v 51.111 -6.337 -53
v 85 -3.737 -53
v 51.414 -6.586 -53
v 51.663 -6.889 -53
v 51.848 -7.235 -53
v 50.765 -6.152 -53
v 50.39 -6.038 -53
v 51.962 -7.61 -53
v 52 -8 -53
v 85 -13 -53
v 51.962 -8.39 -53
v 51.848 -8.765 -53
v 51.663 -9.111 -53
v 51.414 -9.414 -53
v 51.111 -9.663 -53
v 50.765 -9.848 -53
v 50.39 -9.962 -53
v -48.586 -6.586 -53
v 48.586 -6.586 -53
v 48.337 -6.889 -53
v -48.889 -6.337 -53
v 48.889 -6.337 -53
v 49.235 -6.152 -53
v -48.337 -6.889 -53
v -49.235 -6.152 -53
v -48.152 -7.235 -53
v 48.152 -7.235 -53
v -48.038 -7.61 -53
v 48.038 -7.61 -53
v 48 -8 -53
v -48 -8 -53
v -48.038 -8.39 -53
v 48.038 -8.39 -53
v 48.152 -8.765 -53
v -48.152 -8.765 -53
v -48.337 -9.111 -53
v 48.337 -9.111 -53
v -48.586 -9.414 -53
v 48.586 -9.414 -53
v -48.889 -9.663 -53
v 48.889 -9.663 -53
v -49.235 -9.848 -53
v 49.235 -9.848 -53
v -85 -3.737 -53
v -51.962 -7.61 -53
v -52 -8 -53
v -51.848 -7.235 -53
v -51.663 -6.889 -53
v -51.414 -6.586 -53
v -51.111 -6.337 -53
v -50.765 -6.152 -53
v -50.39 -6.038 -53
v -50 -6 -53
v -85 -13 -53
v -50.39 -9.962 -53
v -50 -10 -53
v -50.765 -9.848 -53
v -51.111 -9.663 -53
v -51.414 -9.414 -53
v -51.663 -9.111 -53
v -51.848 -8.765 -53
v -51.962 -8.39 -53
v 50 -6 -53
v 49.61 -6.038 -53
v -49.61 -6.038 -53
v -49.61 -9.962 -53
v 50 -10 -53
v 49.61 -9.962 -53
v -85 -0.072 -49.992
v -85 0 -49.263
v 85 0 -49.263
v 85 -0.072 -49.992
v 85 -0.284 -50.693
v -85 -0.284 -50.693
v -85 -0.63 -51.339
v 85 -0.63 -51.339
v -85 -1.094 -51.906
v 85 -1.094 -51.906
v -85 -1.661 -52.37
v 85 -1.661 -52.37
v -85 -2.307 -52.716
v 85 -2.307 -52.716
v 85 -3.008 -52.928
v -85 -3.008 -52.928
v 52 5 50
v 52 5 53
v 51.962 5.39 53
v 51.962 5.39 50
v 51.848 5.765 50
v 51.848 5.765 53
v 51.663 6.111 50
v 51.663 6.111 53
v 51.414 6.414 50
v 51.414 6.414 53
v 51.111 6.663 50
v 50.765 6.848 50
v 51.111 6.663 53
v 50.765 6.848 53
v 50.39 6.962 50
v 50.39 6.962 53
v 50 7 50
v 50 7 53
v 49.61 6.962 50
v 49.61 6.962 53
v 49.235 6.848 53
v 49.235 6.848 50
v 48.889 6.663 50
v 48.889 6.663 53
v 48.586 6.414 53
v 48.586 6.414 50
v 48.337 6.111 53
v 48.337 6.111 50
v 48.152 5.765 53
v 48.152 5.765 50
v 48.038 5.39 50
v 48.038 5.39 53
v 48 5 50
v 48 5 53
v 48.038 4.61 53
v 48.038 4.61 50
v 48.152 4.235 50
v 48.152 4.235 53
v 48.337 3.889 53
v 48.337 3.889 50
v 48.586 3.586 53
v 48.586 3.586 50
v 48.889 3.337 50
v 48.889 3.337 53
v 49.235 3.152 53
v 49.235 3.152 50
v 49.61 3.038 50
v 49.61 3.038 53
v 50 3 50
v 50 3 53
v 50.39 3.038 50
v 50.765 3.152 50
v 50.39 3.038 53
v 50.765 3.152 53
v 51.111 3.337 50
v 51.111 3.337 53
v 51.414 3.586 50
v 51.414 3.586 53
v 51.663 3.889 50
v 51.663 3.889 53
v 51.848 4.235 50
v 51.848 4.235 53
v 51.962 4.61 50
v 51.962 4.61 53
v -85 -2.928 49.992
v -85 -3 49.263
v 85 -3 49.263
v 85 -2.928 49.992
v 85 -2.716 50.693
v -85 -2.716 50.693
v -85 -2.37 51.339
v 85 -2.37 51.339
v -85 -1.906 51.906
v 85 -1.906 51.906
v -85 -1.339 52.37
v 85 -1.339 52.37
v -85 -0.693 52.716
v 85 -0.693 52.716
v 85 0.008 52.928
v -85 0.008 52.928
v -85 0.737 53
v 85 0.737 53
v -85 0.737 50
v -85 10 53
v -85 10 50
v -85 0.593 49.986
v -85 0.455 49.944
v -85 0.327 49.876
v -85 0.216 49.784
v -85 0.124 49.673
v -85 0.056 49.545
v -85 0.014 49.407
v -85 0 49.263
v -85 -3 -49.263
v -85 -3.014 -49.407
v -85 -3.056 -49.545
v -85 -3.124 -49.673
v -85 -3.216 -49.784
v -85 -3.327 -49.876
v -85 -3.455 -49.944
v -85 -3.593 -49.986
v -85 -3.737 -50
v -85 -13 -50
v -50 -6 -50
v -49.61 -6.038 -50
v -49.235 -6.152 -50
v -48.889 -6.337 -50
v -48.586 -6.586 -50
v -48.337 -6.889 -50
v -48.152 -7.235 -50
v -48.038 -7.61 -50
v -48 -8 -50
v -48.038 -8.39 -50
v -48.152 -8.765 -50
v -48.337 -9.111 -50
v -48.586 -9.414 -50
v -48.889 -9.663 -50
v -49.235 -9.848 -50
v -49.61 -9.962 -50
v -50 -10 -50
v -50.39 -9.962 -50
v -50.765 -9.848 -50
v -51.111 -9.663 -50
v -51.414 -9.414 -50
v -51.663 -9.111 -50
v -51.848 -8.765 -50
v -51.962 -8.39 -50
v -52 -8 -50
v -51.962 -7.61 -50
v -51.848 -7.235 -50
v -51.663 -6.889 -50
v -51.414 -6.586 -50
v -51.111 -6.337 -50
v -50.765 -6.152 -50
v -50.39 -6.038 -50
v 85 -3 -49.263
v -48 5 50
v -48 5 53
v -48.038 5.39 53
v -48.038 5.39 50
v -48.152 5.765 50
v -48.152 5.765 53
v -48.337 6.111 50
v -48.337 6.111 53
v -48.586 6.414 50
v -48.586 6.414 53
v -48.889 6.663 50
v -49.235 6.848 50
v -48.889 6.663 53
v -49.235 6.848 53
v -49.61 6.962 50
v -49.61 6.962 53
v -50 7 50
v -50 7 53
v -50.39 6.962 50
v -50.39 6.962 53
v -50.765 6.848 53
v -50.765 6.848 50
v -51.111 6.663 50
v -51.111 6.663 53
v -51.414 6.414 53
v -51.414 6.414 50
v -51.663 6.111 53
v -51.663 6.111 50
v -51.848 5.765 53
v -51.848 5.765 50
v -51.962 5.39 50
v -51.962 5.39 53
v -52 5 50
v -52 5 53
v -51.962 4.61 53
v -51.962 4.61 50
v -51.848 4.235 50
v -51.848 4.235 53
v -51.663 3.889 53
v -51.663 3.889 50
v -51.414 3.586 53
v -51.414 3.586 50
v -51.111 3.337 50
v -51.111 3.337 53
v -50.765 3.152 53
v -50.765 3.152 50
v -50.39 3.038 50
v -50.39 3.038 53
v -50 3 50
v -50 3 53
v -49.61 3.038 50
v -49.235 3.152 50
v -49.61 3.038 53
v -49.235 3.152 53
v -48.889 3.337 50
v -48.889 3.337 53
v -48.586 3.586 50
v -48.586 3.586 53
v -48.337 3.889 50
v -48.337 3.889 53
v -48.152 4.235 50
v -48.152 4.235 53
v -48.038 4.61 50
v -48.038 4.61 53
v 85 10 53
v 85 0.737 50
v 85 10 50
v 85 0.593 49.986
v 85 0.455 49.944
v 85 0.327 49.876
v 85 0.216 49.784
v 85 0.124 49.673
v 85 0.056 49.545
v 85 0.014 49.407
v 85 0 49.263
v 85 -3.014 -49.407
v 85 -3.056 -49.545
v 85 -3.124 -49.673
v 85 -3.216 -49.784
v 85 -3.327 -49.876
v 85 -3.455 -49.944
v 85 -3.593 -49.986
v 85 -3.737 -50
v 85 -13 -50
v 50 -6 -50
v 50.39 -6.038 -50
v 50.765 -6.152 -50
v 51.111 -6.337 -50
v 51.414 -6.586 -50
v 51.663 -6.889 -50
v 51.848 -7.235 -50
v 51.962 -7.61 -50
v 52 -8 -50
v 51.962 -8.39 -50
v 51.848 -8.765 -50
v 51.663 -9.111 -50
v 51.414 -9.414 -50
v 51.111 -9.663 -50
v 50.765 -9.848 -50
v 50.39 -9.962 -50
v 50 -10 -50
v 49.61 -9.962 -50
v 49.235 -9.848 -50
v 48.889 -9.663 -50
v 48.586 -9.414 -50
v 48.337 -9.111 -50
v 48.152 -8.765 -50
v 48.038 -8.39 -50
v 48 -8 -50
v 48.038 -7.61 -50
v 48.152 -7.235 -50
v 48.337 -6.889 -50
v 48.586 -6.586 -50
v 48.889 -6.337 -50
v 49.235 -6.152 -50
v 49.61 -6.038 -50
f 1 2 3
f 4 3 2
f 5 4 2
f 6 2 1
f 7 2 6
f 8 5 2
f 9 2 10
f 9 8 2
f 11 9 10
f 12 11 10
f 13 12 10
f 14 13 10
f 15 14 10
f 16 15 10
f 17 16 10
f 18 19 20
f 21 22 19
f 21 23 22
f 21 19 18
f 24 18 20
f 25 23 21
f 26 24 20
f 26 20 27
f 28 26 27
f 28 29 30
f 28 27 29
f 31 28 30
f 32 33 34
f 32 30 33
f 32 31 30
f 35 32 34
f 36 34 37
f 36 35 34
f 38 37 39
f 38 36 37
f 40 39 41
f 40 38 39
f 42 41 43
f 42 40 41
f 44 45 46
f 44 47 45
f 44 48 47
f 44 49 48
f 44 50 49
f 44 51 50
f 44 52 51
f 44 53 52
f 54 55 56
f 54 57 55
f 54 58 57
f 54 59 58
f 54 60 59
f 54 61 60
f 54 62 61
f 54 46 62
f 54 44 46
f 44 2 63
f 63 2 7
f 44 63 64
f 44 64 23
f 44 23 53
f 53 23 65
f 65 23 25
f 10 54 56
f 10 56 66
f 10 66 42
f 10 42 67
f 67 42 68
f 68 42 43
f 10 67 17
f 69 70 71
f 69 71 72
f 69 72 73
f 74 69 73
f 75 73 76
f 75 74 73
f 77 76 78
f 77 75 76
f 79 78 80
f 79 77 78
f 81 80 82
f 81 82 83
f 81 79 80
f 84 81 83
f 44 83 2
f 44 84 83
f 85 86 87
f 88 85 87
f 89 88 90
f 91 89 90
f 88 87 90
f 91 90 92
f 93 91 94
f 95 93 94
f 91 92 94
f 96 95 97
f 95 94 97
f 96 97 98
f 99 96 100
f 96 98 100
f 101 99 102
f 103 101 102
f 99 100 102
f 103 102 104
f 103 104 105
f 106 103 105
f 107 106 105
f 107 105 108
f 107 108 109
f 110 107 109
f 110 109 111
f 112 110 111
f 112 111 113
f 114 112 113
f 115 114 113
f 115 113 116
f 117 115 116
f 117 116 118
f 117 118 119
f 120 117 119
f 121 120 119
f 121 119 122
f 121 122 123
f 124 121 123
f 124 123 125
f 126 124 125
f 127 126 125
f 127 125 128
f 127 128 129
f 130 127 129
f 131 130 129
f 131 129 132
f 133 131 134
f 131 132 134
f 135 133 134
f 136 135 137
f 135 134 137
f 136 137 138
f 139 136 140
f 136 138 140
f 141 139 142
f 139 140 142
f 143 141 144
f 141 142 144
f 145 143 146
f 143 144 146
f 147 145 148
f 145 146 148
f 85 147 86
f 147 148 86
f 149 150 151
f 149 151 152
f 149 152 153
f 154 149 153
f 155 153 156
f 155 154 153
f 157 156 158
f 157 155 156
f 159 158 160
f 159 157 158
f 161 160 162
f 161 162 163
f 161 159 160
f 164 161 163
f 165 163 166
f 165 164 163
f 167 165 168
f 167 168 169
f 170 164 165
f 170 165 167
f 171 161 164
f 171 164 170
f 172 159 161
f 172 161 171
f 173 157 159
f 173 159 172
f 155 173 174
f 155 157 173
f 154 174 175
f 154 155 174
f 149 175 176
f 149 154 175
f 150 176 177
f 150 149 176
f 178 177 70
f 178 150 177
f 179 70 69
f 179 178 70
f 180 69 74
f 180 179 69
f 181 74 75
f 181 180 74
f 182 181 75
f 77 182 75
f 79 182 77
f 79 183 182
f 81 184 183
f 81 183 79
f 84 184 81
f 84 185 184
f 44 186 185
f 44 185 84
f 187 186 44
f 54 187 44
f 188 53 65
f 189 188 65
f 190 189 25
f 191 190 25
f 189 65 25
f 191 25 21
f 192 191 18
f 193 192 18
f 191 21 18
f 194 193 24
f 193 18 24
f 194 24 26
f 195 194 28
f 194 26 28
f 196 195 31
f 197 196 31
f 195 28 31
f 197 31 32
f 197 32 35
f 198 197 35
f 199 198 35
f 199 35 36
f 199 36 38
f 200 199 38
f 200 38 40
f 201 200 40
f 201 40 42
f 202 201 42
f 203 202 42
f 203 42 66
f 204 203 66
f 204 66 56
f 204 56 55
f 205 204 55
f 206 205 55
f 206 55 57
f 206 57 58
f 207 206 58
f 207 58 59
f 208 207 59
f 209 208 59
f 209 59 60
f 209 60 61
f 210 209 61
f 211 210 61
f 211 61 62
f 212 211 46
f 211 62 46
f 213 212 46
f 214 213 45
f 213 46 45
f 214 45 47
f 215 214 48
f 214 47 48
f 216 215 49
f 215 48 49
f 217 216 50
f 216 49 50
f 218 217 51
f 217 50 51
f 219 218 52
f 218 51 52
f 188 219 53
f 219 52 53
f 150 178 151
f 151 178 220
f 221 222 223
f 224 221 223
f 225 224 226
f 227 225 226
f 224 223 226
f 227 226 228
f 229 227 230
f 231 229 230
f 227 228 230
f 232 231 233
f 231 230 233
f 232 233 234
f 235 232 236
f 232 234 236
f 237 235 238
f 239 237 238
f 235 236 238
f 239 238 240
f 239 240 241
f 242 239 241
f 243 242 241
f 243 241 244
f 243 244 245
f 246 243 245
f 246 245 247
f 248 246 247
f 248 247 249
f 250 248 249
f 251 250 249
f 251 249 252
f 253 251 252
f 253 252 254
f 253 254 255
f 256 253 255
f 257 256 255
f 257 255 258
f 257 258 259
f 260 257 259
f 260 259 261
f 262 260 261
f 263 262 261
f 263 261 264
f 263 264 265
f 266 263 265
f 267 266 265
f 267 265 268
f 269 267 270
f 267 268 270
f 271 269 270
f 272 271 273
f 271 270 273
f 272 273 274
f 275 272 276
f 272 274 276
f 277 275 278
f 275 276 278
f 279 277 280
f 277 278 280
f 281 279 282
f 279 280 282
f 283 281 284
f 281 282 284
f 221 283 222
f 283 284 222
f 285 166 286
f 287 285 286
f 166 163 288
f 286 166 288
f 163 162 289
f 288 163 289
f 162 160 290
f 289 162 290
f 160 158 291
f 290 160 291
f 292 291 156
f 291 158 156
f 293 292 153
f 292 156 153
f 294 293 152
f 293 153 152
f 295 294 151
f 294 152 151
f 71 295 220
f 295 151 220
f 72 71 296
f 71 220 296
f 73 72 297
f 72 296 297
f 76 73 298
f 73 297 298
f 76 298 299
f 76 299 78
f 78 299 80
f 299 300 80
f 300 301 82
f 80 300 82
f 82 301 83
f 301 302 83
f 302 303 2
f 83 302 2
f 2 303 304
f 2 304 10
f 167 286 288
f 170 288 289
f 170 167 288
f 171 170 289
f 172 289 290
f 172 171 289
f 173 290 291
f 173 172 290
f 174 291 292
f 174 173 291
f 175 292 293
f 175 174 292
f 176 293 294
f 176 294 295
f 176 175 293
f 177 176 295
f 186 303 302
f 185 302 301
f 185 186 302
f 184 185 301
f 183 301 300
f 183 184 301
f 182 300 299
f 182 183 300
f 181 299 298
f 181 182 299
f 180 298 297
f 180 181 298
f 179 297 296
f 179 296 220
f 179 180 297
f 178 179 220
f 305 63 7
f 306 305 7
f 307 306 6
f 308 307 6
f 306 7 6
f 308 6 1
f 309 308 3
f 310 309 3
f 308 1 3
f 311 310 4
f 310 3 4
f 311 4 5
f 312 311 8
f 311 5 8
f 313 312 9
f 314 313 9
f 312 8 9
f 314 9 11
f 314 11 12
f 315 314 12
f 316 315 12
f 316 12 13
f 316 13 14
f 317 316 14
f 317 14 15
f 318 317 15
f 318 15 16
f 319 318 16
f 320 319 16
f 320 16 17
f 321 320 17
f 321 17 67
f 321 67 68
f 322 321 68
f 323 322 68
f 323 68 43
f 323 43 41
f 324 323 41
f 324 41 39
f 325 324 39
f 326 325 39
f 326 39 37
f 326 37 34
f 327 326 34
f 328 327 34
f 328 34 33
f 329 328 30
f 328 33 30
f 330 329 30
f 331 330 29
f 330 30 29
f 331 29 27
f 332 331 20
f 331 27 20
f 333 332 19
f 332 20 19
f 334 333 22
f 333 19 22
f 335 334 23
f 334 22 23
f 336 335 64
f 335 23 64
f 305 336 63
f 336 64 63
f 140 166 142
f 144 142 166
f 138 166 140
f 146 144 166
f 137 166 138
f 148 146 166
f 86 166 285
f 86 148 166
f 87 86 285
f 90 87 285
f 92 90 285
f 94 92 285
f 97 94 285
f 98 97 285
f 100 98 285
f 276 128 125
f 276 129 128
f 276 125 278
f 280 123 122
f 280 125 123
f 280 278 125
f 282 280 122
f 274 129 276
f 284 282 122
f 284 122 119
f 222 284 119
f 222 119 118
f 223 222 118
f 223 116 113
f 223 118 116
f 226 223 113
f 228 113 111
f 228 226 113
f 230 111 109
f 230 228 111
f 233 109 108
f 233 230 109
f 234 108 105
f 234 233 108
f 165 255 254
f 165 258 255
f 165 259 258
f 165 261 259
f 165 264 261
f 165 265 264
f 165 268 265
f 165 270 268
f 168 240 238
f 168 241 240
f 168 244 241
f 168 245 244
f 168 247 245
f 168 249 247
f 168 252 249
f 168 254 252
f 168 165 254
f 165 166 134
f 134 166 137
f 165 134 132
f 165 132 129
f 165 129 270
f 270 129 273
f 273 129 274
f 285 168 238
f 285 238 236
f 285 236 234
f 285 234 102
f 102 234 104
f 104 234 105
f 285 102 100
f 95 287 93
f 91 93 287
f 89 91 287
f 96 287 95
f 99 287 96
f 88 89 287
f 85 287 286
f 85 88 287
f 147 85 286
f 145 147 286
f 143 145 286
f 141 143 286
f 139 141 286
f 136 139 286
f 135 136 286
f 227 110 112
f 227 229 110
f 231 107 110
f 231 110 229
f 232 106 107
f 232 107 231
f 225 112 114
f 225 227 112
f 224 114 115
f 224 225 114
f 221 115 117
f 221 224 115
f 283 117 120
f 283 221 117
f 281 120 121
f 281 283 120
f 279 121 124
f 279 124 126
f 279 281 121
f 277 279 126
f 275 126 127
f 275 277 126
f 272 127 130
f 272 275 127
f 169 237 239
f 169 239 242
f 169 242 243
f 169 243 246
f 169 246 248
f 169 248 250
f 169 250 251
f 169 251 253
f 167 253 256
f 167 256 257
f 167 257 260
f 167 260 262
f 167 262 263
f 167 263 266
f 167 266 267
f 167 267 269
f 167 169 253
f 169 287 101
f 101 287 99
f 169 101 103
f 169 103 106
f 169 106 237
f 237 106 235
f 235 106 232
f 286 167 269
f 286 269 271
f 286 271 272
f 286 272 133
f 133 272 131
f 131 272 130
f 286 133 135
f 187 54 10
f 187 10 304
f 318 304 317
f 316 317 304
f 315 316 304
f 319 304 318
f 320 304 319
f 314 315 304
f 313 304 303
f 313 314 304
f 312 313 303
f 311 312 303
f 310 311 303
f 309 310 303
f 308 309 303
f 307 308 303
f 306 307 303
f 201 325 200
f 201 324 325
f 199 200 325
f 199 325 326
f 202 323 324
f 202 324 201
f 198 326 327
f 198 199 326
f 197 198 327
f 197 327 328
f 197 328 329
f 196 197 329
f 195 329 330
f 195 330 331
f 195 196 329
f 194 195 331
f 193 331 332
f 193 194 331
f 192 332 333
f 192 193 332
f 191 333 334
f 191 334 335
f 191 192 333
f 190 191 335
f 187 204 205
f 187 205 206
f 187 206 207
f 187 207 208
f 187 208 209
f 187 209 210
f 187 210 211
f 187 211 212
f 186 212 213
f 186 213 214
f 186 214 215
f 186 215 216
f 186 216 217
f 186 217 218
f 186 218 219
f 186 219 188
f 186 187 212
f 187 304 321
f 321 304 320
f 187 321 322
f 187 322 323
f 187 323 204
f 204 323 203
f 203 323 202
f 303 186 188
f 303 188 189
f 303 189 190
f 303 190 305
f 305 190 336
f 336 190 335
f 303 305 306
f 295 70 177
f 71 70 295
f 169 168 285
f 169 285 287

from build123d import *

# Parameters (mm, degrees)
SKETCH_1_W                       = 170
SKETCH_1_H                       = 100
SM_BASE_FLANGE_1_DEPTH           = 3
SM_EDGE_FLANGE_3_STRIP_W         = 13.4732
SM_EDGE_FLANGE_3_STRIP_H         = 3
SM_EDGE_FLANGE_3_STRIP_CUT_DEPTH = 170
SM_EDGE_FLANGE_3_DEPTH           = 170
SM_EDGE_FLANGE_4_STRIP_W         = 13.4732
SM_EDGE_FLANGE_4_STRIP_H         = 3
SM_EDGE_FLANGE_4_STRIP_CUT_DEPTH = 170
SM_EDGE_FLANGE_4_DEPTH           = 170
CUT_EXTRUDE_2_REACH              = 138.492
SKETCH_19_R                      = 2
CUT_EXTRUDE_3_REACH              = 138.492
SKETCH_20_R                      = 2


# Sheet-metal steps are written as plain solids
with BuildPart() as part:
    # Sketch 1 → 基体-法兰1 (new body)
    with BuildSketch(Plane(origin=(0, 0, 0), x_dir=(1, 0, 0), z_dir=(0, 1, 0))):
        Rectangle(SKETCH_1_W, SKETCH_1_H)
    extrude(amount=-SM_BASE_FLANGE_1_DEPTH)

    # 边线-法兰3 strip (across the edge) → 边线-法兰3 strip cut (cut)
    with BuildSketch(Plane(origin=(-85, 0, 50), x_dir=(0, 0, -1), z_dir=(1, 0, 0))):
        with Locations((-6, -1.5)):
            Rectangle(SM_EDGE_FLANGE_3_STRIP_W, SM_EDGE_FLANGE_3_STRIP_H)
    extrude(amount=SM_EDGE_FLANGE_3_STRIP_CUT_DEPTH, mode=Mode.SUBTRACT)

    # 边线-法兰3 section (across the edge) → 边线-法兰3 (add)
    with BuildSketch(Plane(origin=(-85, 0, 50), x_dir=(0, 0, -1), z_dir=(1, 0, 0))):
        with BuildLine():
            Line((-3, 0.7366), (-3, 10))
            Line((-3, 10), (0, 10))
            Line((0, 10), (0, 0.7366))
            ThreePointArc((0, 0.7366), (0.215745145, 0.215745145), (0.7366, 0))
            Line((0.7366, 0), (0.7366, -3))
            ThreePointArc((0.7366, -3), (-1.905575199, -1.905575199), (-3, 0.7366))
        make_face()
    extrude(amount=SM_EDGE_FLANGE_3_DEPTH)

    # 边线-法兰4 strip (across the edge) → 边线-法兰4 strip cut (cut)
    with BuildSketch(Plane(origin=(-85, -3, -50), x_dir=(0, 0, 1), z_dir=(1, 0, 0))):
        with Locations((-6, -1.5)):
            Rectangle(SM_EDGE_FLANGE_4_STRIP_W, SM_EDGE_FLANGE_4_STRIP_H)
    extrude(amount=SM_EDGE_FLANGE_4_STRIP_CUT_DEPTH, mode=Mode.SUBTRACT)

    # 边线-法兰4 section (across the edge) → 边线-法兰4 (add)
    with BuildSketch(Plane(origin=(-85, -3, -50), x_dir=(0, 0, 1), z_dir=(1, 0, 0))):
        with BuildLine():
            Line((-3, 0.7366), (-3, 10))
            Line((-3, 10), (0, 10))
            Line((0, 10), (0, 0.7366))
            ThreePointArc((0, 0.7366), (0.215745145, 0.215745145), (0.7366, 0))
            Line((0.7366, 0), (0.7366, -3))
            ThreePointArc((0.7366, -3), (-1.905575199, -1.905575199), (-3, 0.7366))
        make_face()
    extrude(amount=SM_EDGE_FLANGE_4_DEPTH)

    # 草图19 → 切除-拉伸2 (cut, up to next)
    with BuildSketch(Plane.XY.offset(53), mode=Mode.PRIVATE) as cut_extrude_2_sk1:
        with Locations((-50, 5)):
            Circle(SKETCH_19_R)
    cut_extrude_2_tool1 = extrude(cut_extrude_2_sk1.sketch, amount=-CUT_EXTRUDE_2_REACH, mode=Mode.PRIVATE) & part.part
    # 草图19 → 切除-拉伸2 (cut, up to next)
    with BuildSketch(Plane.XY.offset(53), mode=Mode.PRIVATE) as cut_extrude_2_sk2:
        with Locations((50, 5)):
            Circle(SKETCH_19_R)
    cut_extrude_2_tool2 = extrude(cut_extrude_2_sk2.sketch, amount=-CUT_EXTRUDE_2_REACH, mode=Mode.PRIVATE) & part.part
    add(cut_extrude_2_tool1.solids().sort_by_distance((-50, 5, 53))[0], mode=Mode.SUBTRACT)
    add(cut_extrude_2_tool2.solids().sort_by_distance((50, 5, 53))[0], mode=Mode.SUBTRACT)

    # 草图20 → 切除-拉伸3 (cut, up to next)
    with BuildSketch(Plane(origin=(0, 0, -53), x_dir=(-1, 0, 0), z_dir=(0, 0, -1)), mode=Mode.PRIVATE) as cut_extrude_3_sk1:
        with Locations(Location((-50, -8, 0), (0, 0, 90))):
            Circle(SKETCH_20_R)
    cut_extrude_3_tool1 = extrude(cut_extrude_3_sk1.sketch, amount=-CUT_EXTRUDE_3_REACH, mode=Mode.PRIVATE) & part.part
    # 草图20 → 切除-拉伸3 (cut, up to next)
    with BuildSketch(Plane(origin=(0, 0, -53), x_dir=(-1, 0, 0), z_dir=(0, 0, -1)), mode=Mode.PRIVATE) as cut_extrude_3_sk2:
        with Locations(Location((50, -8, 0), (0, 0, 90))):
            Circle(SKETCH_20_R)
    cut_extrude_3_tool2 = extrude(cut_extrude_3_sk2.sketch, amount=-CUT_EXTRUDE_3_REACH, mode=Mode.PRIVATE) & part.part
    add(cut_extrude_3_tool1.solids().sort_by_distance((50, -8, -53))[0], mode=Mode.SUBTRACT)
    add(cut_extrude_3_tool2.solids().sort_by_distance((-50, -8, -53))[0], mode=Mode.SUBTRACT)


solid = part.part
